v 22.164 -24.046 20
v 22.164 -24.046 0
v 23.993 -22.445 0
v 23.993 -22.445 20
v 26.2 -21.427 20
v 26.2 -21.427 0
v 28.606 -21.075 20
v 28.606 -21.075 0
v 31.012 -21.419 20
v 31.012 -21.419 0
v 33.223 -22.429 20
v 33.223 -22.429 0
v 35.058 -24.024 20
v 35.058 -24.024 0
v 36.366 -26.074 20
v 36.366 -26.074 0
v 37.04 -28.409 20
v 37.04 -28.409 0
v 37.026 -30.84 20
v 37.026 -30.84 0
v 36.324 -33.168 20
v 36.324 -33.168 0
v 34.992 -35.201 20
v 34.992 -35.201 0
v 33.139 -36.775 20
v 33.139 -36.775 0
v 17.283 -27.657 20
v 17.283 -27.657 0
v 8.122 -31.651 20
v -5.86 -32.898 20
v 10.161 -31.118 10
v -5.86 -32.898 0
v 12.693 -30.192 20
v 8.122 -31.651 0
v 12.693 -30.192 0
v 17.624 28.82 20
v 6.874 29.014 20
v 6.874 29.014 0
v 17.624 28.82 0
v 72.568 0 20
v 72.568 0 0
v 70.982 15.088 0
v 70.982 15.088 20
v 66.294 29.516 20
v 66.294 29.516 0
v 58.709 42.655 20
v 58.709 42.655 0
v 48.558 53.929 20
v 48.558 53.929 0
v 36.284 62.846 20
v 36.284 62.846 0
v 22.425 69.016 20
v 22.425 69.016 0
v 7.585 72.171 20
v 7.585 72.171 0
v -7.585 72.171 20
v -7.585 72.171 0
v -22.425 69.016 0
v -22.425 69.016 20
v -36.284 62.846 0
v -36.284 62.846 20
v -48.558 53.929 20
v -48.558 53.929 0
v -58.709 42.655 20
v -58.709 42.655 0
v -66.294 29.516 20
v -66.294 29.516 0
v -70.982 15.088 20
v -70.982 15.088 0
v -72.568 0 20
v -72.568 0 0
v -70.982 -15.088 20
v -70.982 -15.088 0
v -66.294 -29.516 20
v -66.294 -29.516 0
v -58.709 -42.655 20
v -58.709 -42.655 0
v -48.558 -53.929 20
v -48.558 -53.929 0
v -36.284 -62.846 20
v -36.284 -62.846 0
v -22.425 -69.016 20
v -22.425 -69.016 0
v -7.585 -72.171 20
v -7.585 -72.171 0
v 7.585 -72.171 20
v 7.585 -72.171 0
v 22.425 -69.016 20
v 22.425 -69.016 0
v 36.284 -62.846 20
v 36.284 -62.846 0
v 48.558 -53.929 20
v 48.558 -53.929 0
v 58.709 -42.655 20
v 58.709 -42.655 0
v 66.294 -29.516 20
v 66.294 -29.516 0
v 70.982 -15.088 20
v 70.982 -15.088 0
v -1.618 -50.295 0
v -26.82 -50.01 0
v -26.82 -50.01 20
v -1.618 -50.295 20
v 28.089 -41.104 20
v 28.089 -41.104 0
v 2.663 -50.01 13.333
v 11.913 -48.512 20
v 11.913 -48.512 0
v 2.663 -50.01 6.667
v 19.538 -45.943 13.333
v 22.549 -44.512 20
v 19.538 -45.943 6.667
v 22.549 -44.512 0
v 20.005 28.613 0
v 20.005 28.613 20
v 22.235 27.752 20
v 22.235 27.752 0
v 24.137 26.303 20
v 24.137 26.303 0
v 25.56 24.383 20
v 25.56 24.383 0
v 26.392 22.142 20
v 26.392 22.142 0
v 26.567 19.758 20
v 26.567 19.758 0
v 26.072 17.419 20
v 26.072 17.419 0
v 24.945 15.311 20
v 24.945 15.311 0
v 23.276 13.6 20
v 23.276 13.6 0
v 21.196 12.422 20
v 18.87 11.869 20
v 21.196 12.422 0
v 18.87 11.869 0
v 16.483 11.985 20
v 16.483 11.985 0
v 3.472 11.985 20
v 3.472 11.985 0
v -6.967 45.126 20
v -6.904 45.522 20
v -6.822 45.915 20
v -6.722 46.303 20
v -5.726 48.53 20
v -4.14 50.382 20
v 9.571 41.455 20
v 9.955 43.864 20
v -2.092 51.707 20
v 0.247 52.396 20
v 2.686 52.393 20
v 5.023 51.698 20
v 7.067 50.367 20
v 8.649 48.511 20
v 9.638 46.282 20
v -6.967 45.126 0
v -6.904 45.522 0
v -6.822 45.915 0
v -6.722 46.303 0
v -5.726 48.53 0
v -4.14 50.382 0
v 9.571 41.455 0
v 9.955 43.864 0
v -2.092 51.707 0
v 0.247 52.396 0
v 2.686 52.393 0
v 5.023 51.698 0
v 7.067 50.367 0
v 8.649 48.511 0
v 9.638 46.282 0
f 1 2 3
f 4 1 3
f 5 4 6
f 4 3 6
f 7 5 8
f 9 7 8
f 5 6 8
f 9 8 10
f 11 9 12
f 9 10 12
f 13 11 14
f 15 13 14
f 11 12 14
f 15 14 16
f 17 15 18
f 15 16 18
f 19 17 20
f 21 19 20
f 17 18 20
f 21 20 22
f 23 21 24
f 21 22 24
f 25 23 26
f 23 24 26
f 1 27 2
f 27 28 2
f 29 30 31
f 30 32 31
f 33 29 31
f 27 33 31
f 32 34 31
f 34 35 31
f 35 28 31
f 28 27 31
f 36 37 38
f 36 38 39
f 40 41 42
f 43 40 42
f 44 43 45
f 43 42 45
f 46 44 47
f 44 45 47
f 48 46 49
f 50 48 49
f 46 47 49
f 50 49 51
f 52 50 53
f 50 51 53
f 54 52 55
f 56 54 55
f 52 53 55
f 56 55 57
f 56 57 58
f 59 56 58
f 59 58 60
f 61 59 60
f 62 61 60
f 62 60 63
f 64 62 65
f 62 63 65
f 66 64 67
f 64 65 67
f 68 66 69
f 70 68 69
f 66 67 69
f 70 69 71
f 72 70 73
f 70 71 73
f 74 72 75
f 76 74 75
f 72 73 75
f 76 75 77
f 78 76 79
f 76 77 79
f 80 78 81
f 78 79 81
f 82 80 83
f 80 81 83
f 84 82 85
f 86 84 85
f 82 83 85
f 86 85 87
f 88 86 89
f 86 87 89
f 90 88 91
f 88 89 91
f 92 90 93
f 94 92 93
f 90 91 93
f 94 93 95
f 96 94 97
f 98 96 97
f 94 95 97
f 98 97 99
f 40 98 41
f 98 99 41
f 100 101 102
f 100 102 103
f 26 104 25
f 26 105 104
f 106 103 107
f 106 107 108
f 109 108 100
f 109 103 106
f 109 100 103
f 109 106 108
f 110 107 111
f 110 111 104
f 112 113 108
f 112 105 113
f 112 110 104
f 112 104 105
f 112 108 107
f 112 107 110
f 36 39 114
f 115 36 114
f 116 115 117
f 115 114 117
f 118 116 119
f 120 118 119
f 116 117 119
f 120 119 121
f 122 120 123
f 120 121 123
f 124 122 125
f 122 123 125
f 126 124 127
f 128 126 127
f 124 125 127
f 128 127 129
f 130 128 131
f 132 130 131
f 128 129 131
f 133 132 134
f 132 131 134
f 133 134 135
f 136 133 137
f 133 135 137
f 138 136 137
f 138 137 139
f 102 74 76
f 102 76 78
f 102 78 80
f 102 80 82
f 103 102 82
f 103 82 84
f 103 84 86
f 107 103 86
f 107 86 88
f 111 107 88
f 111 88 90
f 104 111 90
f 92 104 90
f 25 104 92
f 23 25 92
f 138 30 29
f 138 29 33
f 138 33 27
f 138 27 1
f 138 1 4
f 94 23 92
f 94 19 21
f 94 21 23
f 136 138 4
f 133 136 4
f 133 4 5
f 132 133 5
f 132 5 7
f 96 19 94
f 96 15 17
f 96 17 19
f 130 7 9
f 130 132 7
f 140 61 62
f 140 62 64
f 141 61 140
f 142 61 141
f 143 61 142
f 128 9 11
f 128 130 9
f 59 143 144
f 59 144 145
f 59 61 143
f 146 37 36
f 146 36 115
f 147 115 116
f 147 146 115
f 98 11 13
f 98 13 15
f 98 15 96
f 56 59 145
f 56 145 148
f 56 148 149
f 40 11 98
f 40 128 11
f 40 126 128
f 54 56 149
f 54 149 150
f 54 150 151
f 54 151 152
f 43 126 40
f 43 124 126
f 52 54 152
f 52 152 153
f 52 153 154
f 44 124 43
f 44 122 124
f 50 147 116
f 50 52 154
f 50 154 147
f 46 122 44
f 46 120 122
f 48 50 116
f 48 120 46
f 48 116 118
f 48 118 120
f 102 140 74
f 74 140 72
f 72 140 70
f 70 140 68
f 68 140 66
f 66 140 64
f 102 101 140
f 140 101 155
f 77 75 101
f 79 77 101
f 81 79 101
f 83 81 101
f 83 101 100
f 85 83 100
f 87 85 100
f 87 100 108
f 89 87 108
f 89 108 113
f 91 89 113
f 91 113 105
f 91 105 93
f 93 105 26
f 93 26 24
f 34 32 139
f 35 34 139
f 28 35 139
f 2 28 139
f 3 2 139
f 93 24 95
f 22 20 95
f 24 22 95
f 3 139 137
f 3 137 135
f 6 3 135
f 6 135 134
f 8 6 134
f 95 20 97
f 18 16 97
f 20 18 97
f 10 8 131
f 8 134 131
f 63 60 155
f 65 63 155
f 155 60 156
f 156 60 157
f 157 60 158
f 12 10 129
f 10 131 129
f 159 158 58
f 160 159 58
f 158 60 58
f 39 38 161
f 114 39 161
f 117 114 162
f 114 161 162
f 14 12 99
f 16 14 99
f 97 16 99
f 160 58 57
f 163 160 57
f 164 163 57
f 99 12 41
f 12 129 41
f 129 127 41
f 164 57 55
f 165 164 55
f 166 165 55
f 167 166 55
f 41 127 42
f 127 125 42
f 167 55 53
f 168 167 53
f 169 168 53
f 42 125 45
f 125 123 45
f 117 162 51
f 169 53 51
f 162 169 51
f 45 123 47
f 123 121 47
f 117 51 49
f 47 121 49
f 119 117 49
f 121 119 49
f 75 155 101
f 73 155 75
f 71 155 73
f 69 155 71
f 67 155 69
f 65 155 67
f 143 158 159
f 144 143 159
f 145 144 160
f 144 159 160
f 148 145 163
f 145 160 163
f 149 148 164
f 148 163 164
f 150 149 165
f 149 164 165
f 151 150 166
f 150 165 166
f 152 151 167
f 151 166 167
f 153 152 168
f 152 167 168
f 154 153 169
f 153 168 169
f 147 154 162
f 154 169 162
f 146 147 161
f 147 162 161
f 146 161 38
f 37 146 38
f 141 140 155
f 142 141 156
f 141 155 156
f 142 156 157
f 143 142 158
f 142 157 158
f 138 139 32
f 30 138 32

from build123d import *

# Parameters (mm, degrees)
F0_R     = 72.5682102396
F1_DEPTH = 20


with BuildPart() as f1:
    # F0 (on Top) → F1 (new body)
    with BuildSketch(Plane.XY):
        Circle(F0_R)
        with BuildLine():
            ThreePointArc((22.1639949501, -24.0462341013), (35.0578120406, -24.024439202), (33.1385050428, -36.7746256645))
            add(Edge.make_bspline(
                [(-26.8195513636, -50.0101186335), (-16.3397293577, -50.3620265328), (2.2569416099, -51.0958463241), (19.6306451708, -46.8878952171), (29.1549246758, -40.8179573715), (33.1385050428, -36.7746256645)],
                knots=[0, 0, 0, 0, 0.3979017019, 0.7032152945, 1, 1, 1, 1], degree=3))
            Line((-26.8195513636, -50.0101186335), (-6.967373221, 45.1261032148))
            ThreePointArc((-6.967373221, 45.1261032148), (-6.8654000382, 45.7190077179), (-6.7217441894, 46.303214254))
            ThreePointArc((-6.7217441894, 46.303214254), (3.8794477521, 52.1297184336), (9.5709745897, 41.4554529416))
            Line((9.5709745897, 41.4554529416), (6.8737706169, 29.0141291916))
            Line((6.8737706169, 29.0141291916), (17.6235703774, 28.8198585581))
            ThreePointArc((17.6235703774, 28.8198585581), (26.5673663066, 19.7578688539), (16.4828933265, 11.9851892814))
            Line((16.4828933265, 11.9851892814), (3.4721444827, 11.9851892814))
            Line((3.4721444827, 11.9851892814), (-5.8604949154, -32.8977927566))
            add(Edge.make_bspline(
                [(-5.8604949154, -32.8977927566), (-0.251077846, -32.8079528339), (10.9390044639, -32.2469206836), (17.7138596773, -27.5571513921), (22.1639949501, -24.0462341013)],
                knots=[0, 0, 0, 0, 0.5182413567, 1, 1, 1, 1], degree=3))
        make_face(mode=Mode.SUBTRACT)
    extrude(amount=F1_DEPTH)


solid = f1.part
